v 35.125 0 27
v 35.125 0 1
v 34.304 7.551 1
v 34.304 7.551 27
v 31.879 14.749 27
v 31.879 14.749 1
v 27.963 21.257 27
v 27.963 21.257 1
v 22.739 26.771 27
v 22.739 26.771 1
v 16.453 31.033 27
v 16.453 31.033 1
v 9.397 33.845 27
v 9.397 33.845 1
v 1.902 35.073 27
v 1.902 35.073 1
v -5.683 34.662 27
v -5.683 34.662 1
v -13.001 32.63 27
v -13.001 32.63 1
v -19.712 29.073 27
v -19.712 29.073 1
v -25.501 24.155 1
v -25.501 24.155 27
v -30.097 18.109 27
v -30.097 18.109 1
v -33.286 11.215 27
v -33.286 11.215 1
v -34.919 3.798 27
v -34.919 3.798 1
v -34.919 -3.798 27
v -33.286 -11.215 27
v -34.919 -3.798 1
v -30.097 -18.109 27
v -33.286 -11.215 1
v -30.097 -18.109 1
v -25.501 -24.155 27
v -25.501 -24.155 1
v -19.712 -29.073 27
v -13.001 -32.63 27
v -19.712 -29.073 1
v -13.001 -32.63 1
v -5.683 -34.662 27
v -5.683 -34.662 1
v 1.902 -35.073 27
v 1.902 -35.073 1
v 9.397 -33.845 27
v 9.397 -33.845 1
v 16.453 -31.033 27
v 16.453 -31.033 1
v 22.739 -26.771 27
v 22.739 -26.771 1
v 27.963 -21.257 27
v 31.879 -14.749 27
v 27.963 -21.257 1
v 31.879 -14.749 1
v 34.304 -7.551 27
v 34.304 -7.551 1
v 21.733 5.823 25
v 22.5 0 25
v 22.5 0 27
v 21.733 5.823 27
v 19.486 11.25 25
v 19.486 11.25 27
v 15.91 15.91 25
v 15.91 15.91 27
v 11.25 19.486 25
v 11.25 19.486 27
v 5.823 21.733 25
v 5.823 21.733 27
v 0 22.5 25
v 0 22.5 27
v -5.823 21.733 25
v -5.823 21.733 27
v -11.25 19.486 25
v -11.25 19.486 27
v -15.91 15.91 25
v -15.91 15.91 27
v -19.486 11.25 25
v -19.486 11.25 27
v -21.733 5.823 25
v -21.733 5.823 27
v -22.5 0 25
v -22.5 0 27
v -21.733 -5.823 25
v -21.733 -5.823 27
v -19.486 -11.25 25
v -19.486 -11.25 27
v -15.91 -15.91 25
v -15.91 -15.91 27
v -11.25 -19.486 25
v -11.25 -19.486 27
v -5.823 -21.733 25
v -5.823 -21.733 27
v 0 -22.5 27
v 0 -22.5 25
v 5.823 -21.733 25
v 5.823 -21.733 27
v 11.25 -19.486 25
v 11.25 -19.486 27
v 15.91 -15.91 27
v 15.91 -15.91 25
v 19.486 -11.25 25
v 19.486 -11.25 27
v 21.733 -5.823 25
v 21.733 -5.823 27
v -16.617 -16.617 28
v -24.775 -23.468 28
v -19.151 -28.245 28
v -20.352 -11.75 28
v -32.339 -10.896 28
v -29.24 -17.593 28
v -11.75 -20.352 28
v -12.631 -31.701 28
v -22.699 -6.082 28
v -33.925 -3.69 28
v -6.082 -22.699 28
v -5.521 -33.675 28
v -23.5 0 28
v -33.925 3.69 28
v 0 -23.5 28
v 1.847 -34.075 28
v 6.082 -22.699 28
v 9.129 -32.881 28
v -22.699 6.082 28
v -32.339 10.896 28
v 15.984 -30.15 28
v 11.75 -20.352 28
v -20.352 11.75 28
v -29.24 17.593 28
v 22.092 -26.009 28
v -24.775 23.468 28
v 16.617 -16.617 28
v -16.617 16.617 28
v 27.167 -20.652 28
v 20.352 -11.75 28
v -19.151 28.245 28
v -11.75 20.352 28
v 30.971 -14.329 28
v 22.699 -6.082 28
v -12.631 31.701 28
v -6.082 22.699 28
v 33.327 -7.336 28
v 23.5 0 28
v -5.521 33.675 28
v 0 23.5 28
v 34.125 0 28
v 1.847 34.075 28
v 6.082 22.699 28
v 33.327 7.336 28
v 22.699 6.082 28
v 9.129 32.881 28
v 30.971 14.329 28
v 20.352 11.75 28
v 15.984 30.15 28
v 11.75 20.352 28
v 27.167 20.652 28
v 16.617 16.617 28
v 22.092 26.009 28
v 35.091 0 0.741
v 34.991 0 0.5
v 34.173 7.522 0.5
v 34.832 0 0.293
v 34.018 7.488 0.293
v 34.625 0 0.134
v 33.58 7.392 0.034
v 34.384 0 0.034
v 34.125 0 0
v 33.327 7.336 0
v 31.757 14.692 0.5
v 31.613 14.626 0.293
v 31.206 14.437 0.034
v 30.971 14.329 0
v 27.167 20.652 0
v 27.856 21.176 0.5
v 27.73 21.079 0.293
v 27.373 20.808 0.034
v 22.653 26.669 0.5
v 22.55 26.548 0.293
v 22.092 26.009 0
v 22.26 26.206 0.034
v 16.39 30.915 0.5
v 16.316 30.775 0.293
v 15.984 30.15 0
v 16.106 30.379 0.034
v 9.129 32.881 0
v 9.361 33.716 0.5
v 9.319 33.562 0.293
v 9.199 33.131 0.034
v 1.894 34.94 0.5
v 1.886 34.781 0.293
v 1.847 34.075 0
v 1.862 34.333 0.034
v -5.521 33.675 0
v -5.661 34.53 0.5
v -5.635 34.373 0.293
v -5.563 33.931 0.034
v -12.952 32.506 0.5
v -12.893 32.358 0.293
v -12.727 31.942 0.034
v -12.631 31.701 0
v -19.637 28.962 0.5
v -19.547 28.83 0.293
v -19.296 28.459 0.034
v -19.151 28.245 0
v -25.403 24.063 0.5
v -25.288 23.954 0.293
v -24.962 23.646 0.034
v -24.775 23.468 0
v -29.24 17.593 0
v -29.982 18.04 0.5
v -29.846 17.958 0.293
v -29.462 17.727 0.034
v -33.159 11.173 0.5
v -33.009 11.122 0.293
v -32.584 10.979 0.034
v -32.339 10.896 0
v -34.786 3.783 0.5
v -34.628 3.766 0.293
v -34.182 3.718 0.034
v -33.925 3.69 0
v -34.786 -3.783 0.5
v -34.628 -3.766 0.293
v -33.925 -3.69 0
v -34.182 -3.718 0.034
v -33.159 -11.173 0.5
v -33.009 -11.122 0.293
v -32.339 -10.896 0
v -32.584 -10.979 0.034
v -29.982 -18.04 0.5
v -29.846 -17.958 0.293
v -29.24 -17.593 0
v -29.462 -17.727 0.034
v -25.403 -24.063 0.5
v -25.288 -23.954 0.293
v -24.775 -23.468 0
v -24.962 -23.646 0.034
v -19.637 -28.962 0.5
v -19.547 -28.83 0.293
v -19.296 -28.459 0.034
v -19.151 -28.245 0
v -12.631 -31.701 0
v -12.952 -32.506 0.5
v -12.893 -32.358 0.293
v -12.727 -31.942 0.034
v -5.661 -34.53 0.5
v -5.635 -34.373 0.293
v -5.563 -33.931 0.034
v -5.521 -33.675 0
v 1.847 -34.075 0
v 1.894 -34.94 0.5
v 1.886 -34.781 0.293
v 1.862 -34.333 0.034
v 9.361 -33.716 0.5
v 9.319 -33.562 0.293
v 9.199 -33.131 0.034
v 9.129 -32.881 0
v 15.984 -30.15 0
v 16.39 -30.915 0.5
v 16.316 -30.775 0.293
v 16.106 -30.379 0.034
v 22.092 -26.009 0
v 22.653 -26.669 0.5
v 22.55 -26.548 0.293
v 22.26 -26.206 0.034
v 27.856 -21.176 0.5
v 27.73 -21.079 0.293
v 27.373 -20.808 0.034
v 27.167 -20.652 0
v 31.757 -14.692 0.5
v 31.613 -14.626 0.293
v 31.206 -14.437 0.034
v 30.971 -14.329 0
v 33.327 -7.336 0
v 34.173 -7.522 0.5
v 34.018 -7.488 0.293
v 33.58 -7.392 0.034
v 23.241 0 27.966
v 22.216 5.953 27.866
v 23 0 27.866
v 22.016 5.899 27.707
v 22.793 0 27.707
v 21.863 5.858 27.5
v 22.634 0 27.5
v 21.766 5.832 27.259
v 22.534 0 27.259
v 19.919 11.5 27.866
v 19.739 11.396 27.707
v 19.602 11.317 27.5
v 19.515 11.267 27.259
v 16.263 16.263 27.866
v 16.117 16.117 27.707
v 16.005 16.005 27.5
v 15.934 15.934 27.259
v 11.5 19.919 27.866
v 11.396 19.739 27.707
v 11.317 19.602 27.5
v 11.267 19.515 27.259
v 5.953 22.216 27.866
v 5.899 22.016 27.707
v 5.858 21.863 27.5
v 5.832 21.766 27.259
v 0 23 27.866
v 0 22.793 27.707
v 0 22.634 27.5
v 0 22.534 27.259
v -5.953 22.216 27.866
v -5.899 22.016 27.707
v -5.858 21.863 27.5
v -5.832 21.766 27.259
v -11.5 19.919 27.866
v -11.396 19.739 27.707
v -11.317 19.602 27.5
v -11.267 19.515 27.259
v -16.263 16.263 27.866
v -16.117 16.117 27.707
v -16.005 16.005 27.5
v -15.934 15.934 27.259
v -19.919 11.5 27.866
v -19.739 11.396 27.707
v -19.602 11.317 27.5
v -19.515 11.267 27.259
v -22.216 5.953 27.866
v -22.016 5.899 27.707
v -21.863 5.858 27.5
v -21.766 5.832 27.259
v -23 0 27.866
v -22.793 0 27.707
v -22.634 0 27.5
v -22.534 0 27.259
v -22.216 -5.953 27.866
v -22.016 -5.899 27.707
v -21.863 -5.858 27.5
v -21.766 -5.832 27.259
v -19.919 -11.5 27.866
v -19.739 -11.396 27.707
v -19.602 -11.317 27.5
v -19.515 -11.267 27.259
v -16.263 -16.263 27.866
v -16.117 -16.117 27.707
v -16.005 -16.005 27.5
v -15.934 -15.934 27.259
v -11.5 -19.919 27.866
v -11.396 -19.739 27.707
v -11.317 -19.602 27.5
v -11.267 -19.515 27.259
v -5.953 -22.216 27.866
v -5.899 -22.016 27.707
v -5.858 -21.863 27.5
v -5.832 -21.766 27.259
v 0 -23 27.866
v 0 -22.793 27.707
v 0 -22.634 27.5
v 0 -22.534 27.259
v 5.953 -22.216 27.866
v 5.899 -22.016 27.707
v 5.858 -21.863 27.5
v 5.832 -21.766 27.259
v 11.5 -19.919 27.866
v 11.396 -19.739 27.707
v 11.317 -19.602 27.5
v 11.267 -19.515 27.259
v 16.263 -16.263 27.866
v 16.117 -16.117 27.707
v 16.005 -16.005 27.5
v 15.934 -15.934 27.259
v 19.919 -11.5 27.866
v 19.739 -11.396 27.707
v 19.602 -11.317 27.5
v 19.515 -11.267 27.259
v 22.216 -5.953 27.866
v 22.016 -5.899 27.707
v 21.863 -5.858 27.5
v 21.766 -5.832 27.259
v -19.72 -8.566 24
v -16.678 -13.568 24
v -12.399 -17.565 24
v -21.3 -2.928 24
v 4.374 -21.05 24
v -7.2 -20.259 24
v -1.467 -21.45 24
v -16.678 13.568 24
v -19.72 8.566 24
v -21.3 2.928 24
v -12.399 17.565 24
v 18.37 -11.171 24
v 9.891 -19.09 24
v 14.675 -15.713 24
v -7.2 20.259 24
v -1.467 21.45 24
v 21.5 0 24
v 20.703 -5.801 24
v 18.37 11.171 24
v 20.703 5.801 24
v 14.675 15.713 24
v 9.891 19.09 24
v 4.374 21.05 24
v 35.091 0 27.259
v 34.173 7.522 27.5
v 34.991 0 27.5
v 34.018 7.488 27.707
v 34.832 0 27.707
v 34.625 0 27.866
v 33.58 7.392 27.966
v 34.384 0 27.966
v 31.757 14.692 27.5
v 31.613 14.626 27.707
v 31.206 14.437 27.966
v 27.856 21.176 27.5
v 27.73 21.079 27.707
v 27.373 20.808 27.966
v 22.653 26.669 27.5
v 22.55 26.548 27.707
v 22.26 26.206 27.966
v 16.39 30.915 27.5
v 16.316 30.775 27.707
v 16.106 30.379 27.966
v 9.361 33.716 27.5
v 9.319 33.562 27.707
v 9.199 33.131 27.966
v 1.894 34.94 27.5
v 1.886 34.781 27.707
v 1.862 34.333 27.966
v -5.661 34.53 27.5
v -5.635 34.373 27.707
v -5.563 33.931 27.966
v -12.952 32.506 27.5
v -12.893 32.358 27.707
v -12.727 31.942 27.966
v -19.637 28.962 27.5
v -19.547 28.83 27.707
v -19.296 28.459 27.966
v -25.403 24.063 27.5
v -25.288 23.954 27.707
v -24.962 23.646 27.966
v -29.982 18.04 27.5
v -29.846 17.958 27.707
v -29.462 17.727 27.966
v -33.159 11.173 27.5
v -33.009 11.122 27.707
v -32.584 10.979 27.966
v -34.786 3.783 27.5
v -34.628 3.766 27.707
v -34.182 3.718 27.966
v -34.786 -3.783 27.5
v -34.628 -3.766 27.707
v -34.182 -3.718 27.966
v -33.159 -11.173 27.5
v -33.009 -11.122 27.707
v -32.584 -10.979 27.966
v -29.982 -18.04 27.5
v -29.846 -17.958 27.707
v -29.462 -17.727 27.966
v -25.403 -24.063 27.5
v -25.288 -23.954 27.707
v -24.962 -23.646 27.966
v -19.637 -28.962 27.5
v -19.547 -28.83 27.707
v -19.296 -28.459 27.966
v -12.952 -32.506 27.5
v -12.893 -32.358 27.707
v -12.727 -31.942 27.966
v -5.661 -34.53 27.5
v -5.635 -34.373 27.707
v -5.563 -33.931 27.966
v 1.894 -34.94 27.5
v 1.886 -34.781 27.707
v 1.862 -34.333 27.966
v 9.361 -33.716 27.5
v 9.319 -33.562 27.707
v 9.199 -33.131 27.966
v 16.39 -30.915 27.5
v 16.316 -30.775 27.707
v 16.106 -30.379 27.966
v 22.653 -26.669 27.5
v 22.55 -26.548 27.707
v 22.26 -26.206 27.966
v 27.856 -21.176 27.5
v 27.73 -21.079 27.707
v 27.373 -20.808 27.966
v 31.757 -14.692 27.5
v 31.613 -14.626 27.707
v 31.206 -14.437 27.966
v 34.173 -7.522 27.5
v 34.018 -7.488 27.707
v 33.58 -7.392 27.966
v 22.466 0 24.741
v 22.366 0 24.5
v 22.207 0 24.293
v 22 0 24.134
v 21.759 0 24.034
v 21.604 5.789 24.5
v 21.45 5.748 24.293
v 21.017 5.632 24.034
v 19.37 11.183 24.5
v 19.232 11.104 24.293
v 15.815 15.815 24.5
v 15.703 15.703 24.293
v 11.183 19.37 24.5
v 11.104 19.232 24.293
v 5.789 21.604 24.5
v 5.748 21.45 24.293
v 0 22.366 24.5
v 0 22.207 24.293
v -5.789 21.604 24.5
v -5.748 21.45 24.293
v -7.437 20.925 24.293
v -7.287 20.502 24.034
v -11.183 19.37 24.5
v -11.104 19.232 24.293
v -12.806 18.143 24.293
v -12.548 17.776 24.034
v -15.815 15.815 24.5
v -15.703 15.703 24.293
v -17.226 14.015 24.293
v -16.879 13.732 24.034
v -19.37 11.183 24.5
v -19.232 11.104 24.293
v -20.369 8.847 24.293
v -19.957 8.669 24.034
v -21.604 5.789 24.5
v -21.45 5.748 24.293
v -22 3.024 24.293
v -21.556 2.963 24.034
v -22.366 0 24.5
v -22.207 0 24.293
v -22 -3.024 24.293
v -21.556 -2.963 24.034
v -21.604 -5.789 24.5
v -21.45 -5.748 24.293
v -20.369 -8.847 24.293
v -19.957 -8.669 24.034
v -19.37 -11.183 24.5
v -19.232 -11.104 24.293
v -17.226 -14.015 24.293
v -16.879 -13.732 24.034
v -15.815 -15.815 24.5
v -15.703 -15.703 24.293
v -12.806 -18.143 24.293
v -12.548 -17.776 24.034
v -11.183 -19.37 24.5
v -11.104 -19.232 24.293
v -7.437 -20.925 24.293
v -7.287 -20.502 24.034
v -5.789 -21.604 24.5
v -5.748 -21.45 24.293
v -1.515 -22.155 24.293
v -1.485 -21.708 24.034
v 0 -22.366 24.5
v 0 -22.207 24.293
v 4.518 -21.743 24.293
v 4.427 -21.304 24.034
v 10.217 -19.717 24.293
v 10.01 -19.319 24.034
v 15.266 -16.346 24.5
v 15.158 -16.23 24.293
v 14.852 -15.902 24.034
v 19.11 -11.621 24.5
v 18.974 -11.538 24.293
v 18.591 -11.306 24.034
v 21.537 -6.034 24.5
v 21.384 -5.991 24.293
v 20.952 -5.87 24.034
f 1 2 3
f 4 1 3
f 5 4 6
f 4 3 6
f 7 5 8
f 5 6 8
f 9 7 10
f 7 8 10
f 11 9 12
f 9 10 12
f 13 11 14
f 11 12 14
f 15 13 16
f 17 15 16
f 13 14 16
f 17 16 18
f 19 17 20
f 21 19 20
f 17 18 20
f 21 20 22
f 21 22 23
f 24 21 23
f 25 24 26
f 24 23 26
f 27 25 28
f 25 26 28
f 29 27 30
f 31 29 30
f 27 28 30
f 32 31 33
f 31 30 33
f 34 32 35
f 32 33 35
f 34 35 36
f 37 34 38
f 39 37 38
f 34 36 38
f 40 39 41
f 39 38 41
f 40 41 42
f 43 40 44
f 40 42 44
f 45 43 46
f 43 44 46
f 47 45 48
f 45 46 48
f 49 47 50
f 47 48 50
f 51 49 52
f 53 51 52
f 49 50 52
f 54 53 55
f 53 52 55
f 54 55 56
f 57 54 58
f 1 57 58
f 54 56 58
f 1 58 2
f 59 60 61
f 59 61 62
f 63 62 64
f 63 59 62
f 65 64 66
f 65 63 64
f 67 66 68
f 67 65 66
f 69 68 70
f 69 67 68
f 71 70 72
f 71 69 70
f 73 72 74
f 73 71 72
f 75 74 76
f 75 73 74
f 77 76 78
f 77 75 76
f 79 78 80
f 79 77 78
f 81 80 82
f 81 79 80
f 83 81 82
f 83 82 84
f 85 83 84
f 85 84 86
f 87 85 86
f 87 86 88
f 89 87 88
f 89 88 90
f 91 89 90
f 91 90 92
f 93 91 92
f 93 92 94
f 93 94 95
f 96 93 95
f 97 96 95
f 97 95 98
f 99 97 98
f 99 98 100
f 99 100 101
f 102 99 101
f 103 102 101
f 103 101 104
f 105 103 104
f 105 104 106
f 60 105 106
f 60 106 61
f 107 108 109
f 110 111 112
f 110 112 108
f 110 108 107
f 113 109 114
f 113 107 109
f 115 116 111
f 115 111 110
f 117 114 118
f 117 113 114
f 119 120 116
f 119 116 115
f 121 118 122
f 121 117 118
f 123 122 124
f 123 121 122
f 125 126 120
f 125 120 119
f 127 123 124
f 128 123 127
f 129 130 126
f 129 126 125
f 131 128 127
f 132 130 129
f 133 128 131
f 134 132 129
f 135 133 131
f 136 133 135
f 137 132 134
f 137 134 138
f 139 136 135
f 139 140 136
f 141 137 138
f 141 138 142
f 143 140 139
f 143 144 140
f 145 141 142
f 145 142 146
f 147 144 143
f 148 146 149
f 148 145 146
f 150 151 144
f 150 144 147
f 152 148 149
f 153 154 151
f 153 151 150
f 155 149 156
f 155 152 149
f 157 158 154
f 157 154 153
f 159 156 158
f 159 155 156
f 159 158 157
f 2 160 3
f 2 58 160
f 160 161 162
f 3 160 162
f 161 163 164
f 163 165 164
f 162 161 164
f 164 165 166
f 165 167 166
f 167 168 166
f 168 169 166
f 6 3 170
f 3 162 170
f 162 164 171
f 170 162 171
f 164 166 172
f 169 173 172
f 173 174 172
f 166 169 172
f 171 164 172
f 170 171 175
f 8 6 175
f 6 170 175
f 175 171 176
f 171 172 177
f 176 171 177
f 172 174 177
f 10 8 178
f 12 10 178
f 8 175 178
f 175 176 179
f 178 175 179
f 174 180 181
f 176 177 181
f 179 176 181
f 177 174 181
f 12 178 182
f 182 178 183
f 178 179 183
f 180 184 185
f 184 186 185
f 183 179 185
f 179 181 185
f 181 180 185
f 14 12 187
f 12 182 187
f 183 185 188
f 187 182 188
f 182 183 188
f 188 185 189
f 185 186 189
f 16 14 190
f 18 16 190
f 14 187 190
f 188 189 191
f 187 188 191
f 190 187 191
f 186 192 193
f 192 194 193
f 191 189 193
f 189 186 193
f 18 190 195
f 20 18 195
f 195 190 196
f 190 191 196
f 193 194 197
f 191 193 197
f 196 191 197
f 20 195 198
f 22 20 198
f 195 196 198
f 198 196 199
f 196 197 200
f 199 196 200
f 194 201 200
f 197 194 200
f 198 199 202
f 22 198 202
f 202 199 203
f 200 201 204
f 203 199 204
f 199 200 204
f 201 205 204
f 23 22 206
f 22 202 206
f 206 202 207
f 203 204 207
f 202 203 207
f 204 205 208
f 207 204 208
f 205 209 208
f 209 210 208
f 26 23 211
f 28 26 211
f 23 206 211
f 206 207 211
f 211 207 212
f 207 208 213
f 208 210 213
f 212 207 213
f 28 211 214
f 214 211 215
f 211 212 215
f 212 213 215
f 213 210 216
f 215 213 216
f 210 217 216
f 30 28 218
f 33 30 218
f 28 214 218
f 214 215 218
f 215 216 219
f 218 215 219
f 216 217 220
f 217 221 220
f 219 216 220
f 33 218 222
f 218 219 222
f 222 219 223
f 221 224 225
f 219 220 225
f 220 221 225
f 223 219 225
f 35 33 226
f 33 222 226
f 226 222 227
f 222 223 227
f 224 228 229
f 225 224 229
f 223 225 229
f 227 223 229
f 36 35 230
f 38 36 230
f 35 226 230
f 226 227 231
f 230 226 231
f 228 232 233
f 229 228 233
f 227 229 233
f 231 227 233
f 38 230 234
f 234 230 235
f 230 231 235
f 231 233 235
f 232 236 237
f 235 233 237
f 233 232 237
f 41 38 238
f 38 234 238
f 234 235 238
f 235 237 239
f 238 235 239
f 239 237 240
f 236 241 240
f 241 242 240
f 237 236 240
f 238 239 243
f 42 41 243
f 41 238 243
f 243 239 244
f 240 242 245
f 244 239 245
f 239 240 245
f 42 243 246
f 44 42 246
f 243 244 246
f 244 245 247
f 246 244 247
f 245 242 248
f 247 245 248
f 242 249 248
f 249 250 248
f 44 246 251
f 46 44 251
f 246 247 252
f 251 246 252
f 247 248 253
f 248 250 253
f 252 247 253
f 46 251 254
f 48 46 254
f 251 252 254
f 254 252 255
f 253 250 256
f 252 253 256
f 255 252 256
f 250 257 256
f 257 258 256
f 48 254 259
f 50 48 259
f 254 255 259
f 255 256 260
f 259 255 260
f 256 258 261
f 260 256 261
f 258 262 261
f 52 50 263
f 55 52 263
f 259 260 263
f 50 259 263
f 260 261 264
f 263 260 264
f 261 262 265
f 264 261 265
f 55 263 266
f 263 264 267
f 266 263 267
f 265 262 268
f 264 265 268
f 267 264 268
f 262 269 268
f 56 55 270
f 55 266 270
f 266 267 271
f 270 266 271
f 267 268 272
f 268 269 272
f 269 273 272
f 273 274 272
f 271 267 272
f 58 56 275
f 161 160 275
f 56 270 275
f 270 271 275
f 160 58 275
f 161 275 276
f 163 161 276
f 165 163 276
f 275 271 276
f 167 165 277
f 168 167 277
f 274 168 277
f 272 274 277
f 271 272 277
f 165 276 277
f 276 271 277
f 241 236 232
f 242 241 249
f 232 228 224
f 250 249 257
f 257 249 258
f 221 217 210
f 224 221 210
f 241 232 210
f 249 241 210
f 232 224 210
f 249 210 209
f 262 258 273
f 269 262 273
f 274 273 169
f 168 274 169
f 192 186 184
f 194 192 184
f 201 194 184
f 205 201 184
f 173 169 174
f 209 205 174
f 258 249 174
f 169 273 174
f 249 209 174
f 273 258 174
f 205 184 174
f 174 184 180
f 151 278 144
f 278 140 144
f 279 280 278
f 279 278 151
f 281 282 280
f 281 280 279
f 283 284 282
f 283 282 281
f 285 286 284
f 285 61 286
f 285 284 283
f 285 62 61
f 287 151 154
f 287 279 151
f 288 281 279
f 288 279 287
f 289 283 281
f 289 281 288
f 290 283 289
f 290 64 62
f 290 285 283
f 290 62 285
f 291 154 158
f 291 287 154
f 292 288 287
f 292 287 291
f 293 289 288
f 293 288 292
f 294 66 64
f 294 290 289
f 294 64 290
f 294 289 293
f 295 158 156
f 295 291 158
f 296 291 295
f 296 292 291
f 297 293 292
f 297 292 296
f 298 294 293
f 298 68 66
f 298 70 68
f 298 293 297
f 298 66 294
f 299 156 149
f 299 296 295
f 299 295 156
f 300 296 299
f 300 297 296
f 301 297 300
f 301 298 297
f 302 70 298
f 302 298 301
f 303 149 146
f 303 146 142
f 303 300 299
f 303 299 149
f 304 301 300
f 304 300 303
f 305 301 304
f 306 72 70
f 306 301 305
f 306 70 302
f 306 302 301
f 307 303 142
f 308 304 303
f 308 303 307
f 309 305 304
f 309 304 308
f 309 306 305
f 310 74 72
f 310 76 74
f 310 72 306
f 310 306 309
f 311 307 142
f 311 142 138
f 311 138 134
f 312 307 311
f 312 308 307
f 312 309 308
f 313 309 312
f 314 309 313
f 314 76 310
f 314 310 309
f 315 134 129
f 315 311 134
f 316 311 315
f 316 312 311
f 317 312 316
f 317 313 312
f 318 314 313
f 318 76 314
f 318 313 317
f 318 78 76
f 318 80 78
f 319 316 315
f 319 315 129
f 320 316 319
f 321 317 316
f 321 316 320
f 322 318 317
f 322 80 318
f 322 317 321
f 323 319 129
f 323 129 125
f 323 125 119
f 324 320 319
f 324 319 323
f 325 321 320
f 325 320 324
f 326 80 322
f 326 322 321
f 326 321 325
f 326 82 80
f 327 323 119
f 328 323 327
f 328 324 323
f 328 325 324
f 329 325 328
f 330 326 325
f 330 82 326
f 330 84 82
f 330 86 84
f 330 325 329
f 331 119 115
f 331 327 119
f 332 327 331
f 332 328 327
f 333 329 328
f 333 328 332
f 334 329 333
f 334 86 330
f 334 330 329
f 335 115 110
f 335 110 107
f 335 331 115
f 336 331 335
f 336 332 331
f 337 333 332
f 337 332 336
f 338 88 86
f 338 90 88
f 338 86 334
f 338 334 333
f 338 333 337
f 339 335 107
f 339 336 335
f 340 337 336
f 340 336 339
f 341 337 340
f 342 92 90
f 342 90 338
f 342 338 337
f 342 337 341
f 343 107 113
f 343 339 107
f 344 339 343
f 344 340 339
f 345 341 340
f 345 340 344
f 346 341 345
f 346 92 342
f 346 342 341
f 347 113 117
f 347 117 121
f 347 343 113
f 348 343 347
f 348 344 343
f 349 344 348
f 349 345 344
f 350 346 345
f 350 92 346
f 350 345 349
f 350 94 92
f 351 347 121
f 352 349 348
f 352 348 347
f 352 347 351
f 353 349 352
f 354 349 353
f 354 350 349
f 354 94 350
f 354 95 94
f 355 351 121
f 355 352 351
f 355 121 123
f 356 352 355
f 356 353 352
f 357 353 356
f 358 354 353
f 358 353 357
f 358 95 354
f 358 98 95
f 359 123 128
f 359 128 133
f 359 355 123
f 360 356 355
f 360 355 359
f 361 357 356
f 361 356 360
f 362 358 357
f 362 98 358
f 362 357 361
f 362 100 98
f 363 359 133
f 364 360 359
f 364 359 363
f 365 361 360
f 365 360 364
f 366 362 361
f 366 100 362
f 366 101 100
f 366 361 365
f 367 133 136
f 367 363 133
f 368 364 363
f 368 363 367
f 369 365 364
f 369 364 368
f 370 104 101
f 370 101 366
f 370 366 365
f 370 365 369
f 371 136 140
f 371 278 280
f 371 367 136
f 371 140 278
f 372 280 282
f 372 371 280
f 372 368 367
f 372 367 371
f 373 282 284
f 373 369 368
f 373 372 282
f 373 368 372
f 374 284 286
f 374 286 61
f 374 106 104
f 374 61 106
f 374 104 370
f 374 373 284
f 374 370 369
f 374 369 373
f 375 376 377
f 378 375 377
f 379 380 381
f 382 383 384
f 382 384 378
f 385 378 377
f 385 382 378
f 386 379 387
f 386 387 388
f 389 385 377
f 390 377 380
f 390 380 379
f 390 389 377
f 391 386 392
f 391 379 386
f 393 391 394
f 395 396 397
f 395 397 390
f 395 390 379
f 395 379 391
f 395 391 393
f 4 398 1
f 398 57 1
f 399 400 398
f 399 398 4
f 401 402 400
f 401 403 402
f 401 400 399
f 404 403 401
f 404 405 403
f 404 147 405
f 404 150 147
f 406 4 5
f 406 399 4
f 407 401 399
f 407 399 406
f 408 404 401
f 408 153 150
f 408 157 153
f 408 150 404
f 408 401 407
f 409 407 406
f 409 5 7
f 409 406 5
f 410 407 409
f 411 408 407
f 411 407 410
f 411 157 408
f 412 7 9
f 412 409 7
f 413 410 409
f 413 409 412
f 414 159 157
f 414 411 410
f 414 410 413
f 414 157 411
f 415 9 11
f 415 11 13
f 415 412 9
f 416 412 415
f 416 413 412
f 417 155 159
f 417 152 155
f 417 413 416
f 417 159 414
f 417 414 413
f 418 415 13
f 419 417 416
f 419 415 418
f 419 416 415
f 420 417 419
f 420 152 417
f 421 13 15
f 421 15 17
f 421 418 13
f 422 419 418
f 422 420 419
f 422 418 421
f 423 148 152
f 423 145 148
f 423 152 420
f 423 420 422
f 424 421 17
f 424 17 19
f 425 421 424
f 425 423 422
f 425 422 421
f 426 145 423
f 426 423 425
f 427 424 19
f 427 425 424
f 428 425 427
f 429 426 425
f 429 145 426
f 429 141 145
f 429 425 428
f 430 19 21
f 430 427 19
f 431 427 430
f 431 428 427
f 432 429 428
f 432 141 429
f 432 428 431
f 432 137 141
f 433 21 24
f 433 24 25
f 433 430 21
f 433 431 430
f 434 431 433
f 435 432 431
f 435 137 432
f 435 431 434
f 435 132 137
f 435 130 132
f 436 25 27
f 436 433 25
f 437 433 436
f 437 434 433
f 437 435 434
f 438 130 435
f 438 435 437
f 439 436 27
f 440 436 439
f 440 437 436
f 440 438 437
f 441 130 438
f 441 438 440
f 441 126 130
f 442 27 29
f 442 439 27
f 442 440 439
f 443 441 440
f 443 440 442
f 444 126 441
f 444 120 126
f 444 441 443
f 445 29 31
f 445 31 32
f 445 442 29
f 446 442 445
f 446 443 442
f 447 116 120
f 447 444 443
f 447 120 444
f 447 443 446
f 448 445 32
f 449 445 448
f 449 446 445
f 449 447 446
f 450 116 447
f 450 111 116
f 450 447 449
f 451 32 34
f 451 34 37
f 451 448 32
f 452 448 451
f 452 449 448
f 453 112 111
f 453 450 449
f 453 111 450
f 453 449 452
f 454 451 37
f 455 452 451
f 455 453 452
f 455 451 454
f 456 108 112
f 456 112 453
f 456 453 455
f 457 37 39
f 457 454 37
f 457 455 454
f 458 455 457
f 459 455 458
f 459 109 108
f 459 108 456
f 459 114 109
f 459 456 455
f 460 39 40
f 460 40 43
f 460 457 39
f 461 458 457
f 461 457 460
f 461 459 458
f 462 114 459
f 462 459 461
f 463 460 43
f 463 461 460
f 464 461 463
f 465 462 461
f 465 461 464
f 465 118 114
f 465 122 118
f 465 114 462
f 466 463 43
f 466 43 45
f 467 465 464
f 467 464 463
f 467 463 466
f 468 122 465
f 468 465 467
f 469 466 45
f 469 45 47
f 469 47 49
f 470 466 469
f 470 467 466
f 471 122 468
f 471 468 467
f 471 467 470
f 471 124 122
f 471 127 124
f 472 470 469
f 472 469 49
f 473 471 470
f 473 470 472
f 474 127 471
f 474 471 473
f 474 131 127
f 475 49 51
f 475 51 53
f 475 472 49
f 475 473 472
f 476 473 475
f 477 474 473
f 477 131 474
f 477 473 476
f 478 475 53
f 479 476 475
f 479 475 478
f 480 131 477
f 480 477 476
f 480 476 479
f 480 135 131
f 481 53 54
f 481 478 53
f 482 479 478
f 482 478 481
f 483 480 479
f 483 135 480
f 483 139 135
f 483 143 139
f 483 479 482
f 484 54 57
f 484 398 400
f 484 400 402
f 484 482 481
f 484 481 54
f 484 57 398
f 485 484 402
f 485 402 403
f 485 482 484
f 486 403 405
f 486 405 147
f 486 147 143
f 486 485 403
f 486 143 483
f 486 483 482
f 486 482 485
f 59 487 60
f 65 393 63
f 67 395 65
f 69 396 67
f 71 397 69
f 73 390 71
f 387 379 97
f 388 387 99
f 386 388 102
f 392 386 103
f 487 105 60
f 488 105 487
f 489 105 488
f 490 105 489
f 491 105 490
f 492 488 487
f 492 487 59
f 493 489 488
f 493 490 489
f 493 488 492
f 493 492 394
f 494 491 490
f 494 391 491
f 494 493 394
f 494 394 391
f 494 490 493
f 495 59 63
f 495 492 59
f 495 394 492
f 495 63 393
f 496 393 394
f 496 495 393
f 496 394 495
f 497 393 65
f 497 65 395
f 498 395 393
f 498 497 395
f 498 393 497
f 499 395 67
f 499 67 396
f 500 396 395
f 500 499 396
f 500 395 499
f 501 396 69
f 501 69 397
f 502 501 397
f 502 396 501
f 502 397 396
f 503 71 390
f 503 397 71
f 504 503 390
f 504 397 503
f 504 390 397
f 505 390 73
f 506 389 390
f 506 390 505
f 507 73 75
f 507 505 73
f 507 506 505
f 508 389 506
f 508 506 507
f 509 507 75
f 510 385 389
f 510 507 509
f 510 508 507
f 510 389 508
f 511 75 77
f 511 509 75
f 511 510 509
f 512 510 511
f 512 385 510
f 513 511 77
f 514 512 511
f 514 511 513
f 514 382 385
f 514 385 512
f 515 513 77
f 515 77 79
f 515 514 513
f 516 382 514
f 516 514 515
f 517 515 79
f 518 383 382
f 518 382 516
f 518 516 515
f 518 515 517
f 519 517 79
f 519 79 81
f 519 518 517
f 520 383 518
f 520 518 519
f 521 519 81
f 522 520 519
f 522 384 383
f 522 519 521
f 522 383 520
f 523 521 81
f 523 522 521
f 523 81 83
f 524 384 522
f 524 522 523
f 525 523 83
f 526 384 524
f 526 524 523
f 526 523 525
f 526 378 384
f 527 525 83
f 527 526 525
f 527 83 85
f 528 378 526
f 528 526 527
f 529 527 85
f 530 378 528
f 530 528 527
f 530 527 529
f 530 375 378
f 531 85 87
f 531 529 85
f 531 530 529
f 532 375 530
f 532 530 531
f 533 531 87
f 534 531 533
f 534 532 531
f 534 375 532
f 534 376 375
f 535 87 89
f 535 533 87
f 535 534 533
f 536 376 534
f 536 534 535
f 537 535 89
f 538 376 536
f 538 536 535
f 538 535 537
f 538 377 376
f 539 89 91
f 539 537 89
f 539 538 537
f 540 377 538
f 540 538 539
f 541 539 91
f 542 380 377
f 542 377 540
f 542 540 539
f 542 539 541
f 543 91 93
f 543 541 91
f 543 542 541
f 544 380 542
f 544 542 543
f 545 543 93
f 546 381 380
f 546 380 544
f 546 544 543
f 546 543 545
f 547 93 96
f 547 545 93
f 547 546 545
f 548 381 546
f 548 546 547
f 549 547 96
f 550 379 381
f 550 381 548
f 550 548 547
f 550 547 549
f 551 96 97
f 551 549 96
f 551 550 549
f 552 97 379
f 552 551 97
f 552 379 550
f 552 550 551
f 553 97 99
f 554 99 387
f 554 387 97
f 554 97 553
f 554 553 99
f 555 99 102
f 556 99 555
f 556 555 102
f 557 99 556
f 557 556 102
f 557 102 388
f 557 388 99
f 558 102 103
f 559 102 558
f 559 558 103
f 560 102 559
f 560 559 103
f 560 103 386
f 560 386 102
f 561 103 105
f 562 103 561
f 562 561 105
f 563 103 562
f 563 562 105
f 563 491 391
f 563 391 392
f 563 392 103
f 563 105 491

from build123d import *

# Parameters (mm, degrees)
ESQUISSE1_R        = 22.5
BOSS_EXTRU_1_DEPTH = 24
ESQUISSE1_4_R      = 35.125
ESQUISSE1_4_R_2    = 22.5
BOSS_EXTRU_2_DEPTH = 28
CONG_1_R           = 1


with BuildPart() as part:
    # Esquisse1 → Boss.-Extru.1 (new body)
    with BuildSketch(Plane.XY):
        Circle(ESQUISSE1_R)
    extrude(amount=BOSS_EXTRU_1_DEPTH)

    # Esquisse1<4> → Boss.-Extru.2 (add)
    with BuildSketch(Plane.XY):
        Circle(ESQUISSE1_4_R)
        Circle(ESQUISSE1_4_R_2, mode=Mode.SUBTRACT)
    extrude(amount=BOSS_EXTRU_2_DEPTH)

    # Congé1
    cong_1_edges = [part.edges().sort_by_distance(p)[0] for p in [
        (-35.125, 0, 28),
        (-35.125, 0, 0),
        (-22.5, 0, 24),
        (-22.5, 0, 28),
    ]]
    fillet(cong_1_edges, radius=CONG_1_R)


solid = part.part
